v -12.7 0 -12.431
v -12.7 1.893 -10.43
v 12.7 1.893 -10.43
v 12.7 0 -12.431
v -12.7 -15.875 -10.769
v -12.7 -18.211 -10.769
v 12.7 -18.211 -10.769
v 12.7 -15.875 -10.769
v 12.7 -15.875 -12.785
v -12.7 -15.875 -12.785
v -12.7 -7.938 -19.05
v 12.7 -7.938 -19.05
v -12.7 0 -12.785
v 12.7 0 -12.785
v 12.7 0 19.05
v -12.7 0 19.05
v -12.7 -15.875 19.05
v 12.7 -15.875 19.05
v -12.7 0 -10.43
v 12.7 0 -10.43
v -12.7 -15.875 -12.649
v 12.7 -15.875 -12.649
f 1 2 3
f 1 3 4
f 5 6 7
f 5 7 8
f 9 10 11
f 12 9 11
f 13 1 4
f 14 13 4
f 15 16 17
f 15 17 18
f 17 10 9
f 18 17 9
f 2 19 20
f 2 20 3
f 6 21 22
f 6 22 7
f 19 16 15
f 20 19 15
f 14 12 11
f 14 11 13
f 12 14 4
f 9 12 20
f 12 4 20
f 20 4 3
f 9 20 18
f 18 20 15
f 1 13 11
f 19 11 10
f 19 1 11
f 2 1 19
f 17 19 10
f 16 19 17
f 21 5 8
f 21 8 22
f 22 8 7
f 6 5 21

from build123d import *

# Parameters (mm, degrees)
F0_W      = 25.4
F0_H      = 38.1
F1_DEPTH  = 15.875
F3_DEPTH  = 50.8
F5_DEPTH  = 50.8
F7_DEPTH  = 25.4
F10_DEPTH = 25.4


# Not quite as in the source:
# - a feature names something its author has since deleted; it is built from what else it names


with BuildPart() as f1:
    # F0 (on Front) → F1 (new body)
    with BuildSketch(Plane.XZ):
        Rectangle(F0_W, F0_H)
    extrude(amount=F1_DEPTH)

    # F2 (on face) → F3 (cut)
    with BuildSketch(Plane(origin=(-12.7, 0, 0), x_dir=(0, -1, 0), z_dir=(-1, 0, 0))):
        Polygon((15.875, -12.7851702273), (7.9375, -19.05), (15.875, -19.05), align=None)
    extrude(amount=-F3_DEPTH, mode=Mode.SUBTRACT)

    # F4 (on face) → F5 (cut)
    with BuildSketch(Plane(origin=(-12.7, 0, 0), x_dir=(0, -1, 0), z_dir=(-1, 0, 0))):
        Polygon((7.9375, -19.05), (0, -12.7851702273), (0, -19.05), align=None)
    extrude(amount=-F5_DEPTH, mode=Mode.SUBTRACT)

    # F6 (on face) → F7 (join)
    with BuildSketch(Plane(origin=(-12.7, 0, 0), x_dir=(0, -1, 0), z_dir=(-1, 0, 0))):
        Polygon((0, -12.4311430186), (0, -10.4295834899), (-1.8933862448, -10.4295834899), align=None)
    extrude(amount=-F7_DEPTH)


with BuildPart() as f10:
    # F9 (on face) → F10 (new body)
    with BuildSketch(Plane(origin=(-12.7, 0, 0), x_dir=(0, -1, 0), z_dir=(-1, 0, 0))):
        Polygon((18.2110549376, -10.7685425392), (15.875, -10.7685425392), (15.875, -12.64857003), align=None)
    extrude(amount=-F10_DEPTH)


solid = Compound([f1.part, f10.part])
